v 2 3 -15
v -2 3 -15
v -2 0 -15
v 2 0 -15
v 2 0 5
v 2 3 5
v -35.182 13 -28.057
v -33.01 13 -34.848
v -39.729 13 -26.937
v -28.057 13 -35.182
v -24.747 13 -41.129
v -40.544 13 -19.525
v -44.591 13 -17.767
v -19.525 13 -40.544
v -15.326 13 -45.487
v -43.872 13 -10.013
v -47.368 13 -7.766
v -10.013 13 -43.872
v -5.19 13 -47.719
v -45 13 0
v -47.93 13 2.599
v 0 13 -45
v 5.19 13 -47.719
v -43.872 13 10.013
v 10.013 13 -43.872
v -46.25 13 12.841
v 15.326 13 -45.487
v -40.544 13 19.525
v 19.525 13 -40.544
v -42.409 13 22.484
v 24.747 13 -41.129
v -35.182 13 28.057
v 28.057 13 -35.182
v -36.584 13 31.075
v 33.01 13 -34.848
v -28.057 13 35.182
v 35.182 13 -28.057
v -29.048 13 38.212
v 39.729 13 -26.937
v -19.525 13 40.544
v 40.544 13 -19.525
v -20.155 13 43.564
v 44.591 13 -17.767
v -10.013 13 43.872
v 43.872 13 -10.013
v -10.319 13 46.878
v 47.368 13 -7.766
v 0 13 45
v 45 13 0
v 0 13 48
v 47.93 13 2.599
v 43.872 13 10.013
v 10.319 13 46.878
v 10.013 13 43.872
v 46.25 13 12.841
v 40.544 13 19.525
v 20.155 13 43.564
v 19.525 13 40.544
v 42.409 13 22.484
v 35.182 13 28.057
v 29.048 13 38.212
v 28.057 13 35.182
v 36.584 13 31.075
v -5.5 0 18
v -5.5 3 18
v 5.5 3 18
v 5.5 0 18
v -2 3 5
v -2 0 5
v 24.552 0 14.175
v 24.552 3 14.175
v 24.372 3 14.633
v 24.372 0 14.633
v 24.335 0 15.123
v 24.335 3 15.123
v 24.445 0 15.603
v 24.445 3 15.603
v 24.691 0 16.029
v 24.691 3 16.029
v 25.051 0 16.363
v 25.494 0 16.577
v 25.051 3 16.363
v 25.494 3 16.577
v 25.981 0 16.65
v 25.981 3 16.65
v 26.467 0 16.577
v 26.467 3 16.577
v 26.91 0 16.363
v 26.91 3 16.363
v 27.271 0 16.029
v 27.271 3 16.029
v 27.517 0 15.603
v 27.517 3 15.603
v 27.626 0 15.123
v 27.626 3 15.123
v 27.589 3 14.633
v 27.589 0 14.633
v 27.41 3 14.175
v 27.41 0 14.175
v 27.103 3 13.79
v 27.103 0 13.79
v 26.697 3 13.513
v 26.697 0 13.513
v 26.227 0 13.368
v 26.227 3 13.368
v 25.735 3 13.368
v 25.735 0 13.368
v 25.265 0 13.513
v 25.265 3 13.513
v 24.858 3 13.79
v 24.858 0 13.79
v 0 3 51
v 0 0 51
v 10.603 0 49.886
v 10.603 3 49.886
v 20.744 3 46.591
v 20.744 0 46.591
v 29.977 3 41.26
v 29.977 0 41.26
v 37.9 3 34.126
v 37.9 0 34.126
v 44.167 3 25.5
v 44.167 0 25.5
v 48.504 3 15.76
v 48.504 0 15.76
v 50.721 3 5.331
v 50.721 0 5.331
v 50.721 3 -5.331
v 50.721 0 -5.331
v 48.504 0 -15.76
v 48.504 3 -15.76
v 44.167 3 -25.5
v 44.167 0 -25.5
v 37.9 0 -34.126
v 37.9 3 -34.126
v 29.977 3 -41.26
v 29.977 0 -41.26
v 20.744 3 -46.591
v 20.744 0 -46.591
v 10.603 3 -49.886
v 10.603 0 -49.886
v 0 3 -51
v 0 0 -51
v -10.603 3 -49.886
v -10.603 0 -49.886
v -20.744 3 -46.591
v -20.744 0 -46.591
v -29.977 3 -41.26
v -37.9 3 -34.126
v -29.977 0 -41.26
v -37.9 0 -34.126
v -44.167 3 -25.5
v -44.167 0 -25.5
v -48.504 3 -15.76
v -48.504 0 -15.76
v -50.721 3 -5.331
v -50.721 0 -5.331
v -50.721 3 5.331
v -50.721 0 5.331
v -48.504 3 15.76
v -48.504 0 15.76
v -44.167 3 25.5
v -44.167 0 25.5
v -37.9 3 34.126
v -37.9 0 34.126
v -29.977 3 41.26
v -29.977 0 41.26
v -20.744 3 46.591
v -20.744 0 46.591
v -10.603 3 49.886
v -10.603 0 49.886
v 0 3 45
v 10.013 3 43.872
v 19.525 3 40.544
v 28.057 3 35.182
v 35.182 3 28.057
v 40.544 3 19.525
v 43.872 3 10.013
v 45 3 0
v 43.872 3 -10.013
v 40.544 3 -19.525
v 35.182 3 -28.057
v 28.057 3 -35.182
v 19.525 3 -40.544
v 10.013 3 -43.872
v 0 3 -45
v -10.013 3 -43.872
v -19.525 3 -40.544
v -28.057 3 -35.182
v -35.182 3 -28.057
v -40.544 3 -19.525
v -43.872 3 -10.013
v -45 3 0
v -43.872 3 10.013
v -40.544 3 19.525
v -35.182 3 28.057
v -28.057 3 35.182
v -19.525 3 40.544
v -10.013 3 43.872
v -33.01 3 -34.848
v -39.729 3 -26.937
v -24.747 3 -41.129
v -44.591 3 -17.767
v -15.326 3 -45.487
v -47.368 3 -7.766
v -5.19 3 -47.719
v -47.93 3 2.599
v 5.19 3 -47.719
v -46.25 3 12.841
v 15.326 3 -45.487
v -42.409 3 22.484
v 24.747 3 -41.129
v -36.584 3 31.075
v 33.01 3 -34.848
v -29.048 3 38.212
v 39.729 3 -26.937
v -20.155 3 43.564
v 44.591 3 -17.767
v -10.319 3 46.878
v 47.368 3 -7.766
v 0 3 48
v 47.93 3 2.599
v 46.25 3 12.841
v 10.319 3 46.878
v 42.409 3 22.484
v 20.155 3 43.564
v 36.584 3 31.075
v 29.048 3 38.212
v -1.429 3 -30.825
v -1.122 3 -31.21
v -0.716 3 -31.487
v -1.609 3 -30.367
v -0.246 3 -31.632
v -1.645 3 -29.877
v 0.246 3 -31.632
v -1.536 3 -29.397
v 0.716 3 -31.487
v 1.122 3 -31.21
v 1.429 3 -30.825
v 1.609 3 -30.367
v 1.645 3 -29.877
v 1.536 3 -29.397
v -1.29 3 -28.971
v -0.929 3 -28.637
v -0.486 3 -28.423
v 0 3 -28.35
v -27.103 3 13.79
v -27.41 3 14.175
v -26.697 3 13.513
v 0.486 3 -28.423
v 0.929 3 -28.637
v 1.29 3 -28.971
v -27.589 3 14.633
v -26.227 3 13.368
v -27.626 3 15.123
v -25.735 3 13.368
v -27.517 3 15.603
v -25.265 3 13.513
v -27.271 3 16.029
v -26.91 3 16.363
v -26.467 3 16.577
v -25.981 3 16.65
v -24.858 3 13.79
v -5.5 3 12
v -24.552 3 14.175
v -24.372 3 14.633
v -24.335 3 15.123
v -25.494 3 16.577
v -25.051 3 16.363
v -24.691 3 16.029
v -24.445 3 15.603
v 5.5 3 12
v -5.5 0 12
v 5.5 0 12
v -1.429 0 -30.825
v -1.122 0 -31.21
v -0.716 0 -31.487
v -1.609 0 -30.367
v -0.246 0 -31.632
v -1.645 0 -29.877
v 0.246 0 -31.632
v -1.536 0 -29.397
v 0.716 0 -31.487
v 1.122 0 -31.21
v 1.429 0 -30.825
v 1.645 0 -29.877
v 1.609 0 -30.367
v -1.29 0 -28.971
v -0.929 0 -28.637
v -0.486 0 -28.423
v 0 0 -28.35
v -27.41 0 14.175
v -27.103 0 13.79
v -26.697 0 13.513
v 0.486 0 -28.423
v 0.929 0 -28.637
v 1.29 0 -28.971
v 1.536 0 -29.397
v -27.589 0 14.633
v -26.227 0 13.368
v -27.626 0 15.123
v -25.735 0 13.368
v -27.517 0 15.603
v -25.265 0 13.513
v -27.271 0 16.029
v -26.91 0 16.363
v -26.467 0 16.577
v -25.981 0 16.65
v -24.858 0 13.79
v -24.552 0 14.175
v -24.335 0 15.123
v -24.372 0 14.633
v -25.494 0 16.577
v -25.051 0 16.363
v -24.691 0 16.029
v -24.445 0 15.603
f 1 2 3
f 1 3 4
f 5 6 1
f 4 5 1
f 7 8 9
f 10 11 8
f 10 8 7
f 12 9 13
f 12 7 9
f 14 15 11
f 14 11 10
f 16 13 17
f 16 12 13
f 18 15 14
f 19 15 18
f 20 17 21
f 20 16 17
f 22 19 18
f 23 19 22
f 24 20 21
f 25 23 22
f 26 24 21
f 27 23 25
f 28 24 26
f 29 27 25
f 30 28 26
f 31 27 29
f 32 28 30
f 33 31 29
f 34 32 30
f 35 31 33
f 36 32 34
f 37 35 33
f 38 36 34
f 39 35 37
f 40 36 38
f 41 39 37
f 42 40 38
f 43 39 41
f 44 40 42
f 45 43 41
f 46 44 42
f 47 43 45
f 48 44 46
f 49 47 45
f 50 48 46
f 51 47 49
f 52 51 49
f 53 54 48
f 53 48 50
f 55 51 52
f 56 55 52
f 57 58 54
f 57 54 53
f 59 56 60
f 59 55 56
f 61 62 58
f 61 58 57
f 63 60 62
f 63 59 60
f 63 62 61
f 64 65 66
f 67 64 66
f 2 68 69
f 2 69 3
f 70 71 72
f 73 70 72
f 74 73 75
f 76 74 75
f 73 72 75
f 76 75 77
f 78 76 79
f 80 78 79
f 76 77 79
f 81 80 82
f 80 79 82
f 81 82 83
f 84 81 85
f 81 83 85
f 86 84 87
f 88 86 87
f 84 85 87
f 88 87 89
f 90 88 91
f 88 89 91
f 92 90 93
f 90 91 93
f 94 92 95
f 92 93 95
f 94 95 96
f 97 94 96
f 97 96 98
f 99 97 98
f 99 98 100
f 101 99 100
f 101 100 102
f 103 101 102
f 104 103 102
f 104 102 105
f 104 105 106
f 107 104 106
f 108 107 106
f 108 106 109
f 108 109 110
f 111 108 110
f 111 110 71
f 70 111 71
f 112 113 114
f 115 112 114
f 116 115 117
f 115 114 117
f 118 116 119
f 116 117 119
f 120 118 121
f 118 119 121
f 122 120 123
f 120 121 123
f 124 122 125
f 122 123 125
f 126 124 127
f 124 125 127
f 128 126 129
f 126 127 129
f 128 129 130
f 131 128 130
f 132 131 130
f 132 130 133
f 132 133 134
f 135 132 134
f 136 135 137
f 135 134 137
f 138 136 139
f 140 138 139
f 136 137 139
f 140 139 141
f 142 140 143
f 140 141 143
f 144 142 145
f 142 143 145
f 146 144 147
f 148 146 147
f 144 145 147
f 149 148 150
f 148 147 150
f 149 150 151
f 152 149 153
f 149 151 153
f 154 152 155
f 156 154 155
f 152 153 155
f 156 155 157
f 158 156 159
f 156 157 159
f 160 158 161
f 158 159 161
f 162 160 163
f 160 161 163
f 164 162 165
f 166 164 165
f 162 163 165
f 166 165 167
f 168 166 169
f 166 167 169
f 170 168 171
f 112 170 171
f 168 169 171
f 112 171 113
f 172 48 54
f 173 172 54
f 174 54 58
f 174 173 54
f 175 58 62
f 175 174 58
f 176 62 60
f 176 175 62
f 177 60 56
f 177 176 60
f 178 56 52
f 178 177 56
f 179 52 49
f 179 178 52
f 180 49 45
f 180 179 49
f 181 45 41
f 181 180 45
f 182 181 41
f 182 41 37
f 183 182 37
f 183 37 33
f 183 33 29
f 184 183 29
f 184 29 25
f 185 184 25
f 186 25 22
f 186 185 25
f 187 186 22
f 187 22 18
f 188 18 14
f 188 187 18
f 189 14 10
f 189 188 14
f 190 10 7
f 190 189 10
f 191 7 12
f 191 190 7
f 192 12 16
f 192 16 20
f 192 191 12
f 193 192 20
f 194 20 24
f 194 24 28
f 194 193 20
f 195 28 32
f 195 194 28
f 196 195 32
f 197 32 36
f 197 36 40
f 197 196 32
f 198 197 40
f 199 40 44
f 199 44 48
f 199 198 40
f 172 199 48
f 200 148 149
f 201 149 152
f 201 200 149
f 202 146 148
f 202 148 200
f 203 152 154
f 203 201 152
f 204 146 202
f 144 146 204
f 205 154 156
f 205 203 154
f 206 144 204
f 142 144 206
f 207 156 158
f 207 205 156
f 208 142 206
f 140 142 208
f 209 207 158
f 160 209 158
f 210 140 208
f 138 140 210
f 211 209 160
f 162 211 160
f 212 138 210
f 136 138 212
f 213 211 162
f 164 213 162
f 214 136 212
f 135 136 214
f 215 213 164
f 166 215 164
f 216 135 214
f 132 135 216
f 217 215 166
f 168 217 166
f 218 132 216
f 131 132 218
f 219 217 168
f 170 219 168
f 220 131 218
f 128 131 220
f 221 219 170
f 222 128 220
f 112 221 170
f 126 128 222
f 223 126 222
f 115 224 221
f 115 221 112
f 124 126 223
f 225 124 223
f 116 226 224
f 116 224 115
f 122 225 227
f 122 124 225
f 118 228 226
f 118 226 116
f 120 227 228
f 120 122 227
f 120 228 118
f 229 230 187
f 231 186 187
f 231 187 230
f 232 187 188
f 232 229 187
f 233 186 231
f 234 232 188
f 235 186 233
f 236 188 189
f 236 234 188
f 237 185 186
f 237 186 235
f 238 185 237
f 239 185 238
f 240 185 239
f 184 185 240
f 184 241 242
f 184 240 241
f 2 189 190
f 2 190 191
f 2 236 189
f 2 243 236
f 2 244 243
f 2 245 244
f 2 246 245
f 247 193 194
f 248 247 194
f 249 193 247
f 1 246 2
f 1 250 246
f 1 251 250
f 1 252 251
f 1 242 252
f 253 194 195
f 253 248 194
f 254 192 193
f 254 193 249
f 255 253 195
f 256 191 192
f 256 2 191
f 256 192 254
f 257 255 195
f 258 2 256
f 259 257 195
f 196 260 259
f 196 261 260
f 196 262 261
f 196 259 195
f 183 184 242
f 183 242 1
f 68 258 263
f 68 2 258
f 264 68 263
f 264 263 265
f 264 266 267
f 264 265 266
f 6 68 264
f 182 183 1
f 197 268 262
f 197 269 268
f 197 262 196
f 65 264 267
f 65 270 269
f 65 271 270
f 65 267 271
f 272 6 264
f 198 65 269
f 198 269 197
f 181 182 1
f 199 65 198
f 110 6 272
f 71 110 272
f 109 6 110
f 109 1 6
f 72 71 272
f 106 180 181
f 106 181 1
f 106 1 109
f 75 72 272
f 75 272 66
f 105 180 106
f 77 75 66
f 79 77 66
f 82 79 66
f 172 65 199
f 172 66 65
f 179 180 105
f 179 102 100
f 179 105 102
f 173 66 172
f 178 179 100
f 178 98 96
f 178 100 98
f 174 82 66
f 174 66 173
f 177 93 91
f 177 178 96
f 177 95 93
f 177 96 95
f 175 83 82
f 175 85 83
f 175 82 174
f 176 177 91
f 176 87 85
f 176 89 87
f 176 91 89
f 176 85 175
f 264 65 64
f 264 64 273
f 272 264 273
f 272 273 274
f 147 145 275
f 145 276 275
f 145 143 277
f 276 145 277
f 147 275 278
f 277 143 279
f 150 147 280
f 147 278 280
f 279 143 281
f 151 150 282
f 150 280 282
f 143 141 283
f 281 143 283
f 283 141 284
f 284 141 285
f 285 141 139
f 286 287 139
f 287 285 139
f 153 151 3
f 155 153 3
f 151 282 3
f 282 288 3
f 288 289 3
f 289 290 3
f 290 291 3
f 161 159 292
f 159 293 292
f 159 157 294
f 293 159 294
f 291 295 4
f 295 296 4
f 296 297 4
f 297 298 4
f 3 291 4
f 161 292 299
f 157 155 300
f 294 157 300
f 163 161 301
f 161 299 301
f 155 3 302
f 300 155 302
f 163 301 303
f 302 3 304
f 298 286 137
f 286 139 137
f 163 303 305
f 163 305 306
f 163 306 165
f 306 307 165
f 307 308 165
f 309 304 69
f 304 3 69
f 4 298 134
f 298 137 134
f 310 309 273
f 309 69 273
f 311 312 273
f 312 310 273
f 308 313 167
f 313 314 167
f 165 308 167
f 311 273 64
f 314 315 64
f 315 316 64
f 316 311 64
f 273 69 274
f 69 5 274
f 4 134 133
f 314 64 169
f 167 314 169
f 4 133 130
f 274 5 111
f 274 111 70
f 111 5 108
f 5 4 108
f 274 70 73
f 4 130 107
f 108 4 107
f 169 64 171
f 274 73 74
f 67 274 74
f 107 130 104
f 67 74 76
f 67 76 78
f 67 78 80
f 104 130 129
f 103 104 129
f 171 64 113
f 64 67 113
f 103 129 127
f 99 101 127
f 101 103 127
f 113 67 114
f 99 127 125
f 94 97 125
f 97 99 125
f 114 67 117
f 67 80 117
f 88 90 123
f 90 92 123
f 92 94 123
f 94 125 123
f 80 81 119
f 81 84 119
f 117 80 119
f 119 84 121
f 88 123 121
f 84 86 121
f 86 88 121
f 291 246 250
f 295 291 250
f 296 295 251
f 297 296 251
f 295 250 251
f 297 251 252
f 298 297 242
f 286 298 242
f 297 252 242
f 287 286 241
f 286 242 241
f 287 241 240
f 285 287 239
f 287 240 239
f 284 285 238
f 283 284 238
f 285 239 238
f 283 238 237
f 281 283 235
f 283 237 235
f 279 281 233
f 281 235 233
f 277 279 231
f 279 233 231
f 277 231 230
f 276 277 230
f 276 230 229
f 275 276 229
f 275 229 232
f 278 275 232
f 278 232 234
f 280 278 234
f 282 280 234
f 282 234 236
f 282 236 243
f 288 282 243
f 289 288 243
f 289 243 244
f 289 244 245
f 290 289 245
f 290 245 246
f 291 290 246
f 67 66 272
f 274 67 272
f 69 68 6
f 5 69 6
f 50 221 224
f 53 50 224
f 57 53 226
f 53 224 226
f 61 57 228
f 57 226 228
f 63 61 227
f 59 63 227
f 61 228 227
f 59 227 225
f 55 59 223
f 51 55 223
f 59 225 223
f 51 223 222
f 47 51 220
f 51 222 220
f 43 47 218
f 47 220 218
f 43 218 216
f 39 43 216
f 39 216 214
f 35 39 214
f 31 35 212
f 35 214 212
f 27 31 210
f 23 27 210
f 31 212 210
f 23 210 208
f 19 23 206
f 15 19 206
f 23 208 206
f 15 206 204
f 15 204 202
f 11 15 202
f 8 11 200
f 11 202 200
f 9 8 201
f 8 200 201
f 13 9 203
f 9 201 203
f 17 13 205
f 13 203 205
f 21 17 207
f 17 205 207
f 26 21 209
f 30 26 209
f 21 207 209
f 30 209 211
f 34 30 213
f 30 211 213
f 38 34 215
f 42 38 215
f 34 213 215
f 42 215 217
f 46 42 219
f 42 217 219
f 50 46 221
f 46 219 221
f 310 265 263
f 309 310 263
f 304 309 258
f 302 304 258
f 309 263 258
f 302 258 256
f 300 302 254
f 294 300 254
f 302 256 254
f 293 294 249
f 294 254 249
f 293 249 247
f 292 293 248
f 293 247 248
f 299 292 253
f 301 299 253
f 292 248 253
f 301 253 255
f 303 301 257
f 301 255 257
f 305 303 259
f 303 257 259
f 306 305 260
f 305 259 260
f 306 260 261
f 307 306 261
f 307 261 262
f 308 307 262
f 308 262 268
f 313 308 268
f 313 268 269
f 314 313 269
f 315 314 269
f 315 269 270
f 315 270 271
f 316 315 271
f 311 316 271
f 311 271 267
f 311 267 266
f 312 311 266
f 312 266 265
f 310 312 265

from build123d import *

# Parameters (mm, degrees)
SKETCH_1_R               = 51
EXTRUDE_1_DEPTH          = 3
SKETCH_2_R               = 48
SKETCH_2_R_2             = 45
EXTRUDE_2_DEPTH          = 10
SKETCH_5_R               = 1.65
CUT_EXTRUDE_1_DEPTH      = 10
PATTERN_CIRCULAR_1_COUNT = 3
SKETCH_6_W               = 4
SKETCH_6_H               = 20
SKETCH_6_W_2             = 11
SKETCH_6_H_2             = 6
CUT_EXTRUDE_2_DEPTH      = 10


with BuildPart() as part:
    # Эскиз1 → Бобышка-Вытянуть1 (new body)
    with BuildSketch(Plane(origin=(0, 0, 0), x_dir=(1, 0, 0), z_dir=(0, 1, 0))):
        with Locations(Location((0, 0, 0), (0, 0, 270))):
            Circle(SKETCH_1_R)
    extrude(amount=EXTRUDE_1_DEPTH)

    # Эскиз2 → Бобышка-Вытянуть2 (add)
    with BuildSketch(Plane(origin=(0, 3, 0), x_dir=(1, 0, 0), z_dir=(0, 1, 0))):
        with Locations(Location((0, 0, 0), (0, 0, 270))):
            Circle(SKETCH_2_R)
        with Locations(Location((0, 0, 0), (0, 0, 270))):
            Circle(SKETCH_2_R_2, mode=Mode.SUBTRACT)
    extrude(amount=EXTRUDE_2_DEPTH)

    # Эскиз5 → Вырез-Вытянуть1 (cut)
    with BuildSketch(Plane(origin=(0, 3, 0), x_dir=(1, 0, 0), z_dir=(0, 1, 0))):
        with Locations(Location((0, 30, 0), (0, 0, 270))):
            Circle(SKETCH_5_R)
    cut_extrude_1 = extrude(amount=-CUT_EXTRUDE_1_DEPTH, mode=Mode.SUBTRACT)

    # Круговой массив1: Вырез-Вытянуть1 ×3 about axis
    pattern_circular_1_axis = Axis((0, 0, 0), (0, 1, 0))
    for i in range(1, PATTERN_CIRCULAR_1_COUNT):
        add(cut_extrude_1.rotate(pattern_circular_1_axis, i * 360 / PATTERN_CIRCULAR_1_COUNT), mode=Mode.SUBTRACT)

    # Эскиз6 → Вырез-Вытянуть2 (cut)
    with BuildSketch(Plane(origin=(0, 3, 0), x_dir=(1, 0, 0), z_dir=(0, 1, 0))):
        with Locations((0, 5)):
            Rectangle(SKETCH_6_W, SKETCH_6_H)
        with Locations((0, -15)):
            Rectangle(SKETCH_6_W_2, SKETCH_6_H_2)
    extrude(amount=-CUT_EXTRUDE_2_DEPTH, mode=Mode.SUBTRACT)


solid = part.part
